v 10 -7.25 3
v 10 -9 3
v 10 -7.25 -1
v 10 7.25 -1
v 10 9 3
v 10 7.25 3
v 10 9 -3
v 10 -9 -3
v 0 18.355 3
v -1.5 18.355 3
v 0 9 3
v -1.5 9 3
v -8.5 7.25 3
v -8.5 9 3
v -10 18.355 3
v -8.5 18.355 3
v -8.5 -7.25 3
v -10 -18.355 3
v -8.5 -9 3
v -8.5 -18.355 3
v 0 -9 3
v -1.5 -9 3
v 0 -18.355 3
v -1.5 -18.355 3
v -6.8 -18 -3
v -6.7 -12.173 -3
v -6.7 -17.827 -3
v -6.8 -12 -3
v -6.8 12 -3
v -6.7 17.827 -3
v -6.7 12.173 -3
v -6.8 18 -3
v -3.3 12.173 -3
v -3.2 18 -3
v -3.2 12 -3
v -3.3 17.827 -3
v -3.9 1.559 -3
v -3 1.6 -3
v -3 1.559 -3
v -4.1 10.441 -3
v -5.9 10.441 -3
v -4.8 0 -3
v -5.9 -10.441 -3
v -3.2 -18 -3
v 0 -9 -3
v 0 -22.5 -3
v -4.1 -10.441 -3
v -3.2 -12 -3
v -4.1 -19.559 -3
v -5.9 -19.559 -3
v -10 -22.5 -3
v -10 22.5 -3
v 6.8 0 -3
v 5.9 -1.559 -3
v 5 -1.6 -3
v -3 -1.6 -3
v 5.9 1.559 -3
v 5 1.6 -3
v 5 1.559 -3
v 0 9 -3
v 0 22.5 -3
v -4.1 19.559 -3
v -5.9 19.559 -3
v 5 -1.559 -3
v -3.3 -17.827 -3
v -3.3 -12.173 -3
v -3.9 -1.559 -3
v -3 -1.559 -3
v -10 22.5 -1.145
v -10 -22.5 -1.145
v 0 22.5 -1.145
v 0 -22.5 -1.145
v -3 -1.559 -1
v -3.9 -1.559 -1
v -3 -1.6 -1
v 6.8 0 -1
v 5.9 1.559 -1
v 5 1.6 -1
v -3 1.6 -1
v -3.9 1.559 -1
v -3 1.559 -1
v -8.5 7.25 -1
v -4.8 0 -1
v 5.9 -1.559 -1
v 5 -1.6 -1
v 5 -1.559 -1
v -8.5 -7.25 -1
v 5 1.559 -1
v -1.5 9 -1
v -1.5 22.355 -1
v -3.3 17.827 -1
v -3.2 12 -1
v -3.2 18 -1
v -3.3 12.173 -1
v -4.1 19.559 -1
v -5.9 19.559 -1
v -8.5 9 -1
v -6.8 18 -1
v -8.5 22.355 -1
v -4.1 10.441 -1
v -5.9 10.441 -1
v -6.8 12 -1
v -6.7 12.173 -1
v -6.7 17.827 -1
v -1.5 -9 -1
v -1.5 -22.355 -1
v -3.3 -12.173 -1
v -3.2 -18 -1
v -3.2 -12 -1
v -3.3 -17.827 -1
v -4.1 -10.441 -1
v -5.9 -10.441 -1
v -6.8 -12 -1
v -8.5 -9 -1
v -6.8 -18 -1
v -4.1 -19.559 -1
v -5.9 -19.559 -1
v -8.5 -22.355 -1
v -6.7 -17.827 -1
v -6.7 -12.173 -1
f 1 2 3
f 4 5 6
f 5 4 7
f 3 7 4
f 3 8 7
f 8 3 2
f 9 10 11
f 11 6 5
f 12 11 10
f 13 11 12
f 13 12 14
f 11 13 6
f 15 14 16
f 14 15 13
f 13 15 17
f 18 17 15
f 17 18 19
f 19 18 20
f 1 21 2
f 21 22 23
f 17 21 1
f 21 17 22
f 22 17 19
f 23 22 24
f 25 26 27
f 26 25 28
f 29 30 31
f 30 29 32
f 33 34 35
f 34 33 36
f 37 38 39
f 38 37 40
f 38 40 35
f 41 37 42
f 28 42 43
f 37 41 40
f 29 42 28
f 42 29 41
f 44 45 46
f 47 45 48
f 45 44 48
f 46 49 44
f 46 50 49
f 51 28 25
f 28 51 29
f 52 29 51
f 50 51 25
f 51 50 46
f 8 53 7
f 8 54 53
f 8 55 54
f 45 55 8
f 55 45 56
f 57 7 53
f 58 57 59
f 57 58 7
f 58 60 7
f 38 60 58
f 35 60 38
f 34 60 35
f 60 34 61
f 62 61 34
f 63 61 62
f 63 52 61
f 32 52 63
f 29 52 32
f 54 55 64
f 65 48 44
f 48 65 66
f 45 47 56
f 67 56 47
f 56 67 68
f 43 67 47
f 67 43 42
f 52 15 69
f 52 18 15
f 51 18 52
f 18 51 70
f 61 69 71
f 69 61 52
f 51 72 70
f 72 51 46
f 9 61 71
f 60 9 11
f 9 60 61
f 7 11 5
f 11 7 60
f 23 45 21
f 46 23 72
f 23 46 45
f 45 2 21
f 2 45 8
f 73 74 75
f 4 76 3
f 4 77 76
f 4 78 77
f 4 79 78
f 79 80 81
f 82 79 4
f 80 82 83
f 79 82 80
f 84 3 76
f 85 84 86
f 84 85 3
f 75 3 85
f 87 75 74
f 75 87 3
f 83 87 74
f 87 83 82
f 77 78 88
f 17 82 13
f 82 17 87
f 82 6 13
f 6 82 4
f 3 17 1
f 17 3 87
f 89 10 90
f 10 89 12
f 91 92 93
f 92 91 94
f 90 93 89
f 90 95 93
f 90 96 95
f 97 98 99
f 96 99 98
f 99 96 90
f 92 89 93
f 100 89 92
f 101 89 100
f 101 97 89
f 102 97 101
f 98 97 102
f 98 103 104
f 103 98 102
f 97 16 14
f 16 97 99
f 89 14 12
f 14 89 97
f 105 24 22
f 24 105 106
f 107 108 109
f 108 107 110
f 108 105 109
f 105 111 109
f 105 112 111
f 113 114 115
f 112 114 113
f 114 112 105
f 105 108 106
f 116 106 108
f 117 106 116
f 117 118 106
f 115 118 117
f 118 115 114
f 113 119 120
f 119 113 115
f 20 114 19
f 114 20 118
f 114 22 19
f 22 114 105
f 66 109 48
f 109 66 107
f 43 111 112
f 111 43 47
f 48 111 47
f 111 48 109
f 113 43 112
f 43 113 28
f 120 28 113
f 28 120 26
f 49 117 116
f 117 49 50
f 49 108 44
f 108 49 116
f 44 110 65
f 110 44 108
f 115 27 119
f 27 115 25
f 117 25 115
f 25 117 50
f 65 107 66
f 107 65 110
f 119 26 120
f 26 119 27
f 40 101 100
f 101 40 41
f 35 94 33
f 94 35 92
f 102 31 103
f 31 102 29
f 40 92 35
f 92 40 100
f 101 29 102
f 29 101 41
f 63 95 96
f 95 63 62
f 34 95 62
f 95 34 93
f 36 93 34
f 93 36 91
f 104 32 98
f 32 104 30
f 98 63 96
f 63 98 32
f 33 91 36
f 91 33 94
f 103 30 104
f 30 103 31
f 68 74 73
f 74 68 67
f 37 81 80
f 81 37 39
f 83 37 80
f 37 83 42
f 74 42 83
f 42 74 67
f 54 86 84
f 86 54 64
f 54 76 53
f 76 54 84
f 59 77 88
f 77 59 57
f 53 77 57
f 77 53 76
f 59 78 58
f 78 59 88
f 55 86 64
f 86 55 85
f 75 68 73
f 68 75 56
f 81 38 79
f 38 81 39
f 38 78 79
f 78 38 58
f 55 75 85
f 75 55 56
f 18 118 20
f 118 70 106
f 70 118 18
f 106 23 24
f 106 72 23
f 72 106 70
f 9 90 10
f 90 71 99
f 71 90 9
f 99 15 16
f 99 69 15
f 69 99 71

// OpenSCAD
intersection () {
  difference () {
    cube ([20, 45, 6], center=true);
    translate ([5, 16, 0]) {
      cube ([10, 14, 6], center=true);
    }
    translate ([5, -16, 0]) {
      cube ([10, 14, 6], center=true);
    }
    translate ([1.5, 0, 1]) {
      cube ([20, 14.5, 4], center=true);
    }
    translate ([-5, 16, 1]) {
      cube ([7, 14, 4], center=true);
    }
    translate ([-5, -16, 1]) {
      cube ([7, 14, 4], center=true);
    }
    translate ([-5, -12, 0]) {
      cylinder (h=6, r=1.8, center=true);
    }
    translate ([-5, -18, 0]) {
      cylinder (h=6, r=1.8, center=true);
    }
    translate ([-5, -15, 0]) {
      cube ([3.4, 6, 6], center=true);
    }
    translate ([-5, 12, 0]) {
      cylinder (h=6, r=1.8, center=true);
    }
    translate ([-5, 18, 0]) {
      cylinder (h=6, r=1.8, center=true);
    }
    translate ([-5, 15, 0]) {
      cube ([3.4, 6, 6], center=true);
    }
    translate ([-3, 0, 0]) {
      cylinder (h=6, r=1.8, center=true);
    }
    translate ([5, 0, 0]) {
      cylinder (h=6, r=1.8, center=true);
    }
    translate ([1, 0, 0]) {
      cube ([8, 3.2, 6], center=true);
    }
  }
  translate ([0, 0, -14]) {
    rotate (a=45.0, v=[1, 0, 0]) {
      cube ([20, 50, 50], center=true);
    }
  }
}
